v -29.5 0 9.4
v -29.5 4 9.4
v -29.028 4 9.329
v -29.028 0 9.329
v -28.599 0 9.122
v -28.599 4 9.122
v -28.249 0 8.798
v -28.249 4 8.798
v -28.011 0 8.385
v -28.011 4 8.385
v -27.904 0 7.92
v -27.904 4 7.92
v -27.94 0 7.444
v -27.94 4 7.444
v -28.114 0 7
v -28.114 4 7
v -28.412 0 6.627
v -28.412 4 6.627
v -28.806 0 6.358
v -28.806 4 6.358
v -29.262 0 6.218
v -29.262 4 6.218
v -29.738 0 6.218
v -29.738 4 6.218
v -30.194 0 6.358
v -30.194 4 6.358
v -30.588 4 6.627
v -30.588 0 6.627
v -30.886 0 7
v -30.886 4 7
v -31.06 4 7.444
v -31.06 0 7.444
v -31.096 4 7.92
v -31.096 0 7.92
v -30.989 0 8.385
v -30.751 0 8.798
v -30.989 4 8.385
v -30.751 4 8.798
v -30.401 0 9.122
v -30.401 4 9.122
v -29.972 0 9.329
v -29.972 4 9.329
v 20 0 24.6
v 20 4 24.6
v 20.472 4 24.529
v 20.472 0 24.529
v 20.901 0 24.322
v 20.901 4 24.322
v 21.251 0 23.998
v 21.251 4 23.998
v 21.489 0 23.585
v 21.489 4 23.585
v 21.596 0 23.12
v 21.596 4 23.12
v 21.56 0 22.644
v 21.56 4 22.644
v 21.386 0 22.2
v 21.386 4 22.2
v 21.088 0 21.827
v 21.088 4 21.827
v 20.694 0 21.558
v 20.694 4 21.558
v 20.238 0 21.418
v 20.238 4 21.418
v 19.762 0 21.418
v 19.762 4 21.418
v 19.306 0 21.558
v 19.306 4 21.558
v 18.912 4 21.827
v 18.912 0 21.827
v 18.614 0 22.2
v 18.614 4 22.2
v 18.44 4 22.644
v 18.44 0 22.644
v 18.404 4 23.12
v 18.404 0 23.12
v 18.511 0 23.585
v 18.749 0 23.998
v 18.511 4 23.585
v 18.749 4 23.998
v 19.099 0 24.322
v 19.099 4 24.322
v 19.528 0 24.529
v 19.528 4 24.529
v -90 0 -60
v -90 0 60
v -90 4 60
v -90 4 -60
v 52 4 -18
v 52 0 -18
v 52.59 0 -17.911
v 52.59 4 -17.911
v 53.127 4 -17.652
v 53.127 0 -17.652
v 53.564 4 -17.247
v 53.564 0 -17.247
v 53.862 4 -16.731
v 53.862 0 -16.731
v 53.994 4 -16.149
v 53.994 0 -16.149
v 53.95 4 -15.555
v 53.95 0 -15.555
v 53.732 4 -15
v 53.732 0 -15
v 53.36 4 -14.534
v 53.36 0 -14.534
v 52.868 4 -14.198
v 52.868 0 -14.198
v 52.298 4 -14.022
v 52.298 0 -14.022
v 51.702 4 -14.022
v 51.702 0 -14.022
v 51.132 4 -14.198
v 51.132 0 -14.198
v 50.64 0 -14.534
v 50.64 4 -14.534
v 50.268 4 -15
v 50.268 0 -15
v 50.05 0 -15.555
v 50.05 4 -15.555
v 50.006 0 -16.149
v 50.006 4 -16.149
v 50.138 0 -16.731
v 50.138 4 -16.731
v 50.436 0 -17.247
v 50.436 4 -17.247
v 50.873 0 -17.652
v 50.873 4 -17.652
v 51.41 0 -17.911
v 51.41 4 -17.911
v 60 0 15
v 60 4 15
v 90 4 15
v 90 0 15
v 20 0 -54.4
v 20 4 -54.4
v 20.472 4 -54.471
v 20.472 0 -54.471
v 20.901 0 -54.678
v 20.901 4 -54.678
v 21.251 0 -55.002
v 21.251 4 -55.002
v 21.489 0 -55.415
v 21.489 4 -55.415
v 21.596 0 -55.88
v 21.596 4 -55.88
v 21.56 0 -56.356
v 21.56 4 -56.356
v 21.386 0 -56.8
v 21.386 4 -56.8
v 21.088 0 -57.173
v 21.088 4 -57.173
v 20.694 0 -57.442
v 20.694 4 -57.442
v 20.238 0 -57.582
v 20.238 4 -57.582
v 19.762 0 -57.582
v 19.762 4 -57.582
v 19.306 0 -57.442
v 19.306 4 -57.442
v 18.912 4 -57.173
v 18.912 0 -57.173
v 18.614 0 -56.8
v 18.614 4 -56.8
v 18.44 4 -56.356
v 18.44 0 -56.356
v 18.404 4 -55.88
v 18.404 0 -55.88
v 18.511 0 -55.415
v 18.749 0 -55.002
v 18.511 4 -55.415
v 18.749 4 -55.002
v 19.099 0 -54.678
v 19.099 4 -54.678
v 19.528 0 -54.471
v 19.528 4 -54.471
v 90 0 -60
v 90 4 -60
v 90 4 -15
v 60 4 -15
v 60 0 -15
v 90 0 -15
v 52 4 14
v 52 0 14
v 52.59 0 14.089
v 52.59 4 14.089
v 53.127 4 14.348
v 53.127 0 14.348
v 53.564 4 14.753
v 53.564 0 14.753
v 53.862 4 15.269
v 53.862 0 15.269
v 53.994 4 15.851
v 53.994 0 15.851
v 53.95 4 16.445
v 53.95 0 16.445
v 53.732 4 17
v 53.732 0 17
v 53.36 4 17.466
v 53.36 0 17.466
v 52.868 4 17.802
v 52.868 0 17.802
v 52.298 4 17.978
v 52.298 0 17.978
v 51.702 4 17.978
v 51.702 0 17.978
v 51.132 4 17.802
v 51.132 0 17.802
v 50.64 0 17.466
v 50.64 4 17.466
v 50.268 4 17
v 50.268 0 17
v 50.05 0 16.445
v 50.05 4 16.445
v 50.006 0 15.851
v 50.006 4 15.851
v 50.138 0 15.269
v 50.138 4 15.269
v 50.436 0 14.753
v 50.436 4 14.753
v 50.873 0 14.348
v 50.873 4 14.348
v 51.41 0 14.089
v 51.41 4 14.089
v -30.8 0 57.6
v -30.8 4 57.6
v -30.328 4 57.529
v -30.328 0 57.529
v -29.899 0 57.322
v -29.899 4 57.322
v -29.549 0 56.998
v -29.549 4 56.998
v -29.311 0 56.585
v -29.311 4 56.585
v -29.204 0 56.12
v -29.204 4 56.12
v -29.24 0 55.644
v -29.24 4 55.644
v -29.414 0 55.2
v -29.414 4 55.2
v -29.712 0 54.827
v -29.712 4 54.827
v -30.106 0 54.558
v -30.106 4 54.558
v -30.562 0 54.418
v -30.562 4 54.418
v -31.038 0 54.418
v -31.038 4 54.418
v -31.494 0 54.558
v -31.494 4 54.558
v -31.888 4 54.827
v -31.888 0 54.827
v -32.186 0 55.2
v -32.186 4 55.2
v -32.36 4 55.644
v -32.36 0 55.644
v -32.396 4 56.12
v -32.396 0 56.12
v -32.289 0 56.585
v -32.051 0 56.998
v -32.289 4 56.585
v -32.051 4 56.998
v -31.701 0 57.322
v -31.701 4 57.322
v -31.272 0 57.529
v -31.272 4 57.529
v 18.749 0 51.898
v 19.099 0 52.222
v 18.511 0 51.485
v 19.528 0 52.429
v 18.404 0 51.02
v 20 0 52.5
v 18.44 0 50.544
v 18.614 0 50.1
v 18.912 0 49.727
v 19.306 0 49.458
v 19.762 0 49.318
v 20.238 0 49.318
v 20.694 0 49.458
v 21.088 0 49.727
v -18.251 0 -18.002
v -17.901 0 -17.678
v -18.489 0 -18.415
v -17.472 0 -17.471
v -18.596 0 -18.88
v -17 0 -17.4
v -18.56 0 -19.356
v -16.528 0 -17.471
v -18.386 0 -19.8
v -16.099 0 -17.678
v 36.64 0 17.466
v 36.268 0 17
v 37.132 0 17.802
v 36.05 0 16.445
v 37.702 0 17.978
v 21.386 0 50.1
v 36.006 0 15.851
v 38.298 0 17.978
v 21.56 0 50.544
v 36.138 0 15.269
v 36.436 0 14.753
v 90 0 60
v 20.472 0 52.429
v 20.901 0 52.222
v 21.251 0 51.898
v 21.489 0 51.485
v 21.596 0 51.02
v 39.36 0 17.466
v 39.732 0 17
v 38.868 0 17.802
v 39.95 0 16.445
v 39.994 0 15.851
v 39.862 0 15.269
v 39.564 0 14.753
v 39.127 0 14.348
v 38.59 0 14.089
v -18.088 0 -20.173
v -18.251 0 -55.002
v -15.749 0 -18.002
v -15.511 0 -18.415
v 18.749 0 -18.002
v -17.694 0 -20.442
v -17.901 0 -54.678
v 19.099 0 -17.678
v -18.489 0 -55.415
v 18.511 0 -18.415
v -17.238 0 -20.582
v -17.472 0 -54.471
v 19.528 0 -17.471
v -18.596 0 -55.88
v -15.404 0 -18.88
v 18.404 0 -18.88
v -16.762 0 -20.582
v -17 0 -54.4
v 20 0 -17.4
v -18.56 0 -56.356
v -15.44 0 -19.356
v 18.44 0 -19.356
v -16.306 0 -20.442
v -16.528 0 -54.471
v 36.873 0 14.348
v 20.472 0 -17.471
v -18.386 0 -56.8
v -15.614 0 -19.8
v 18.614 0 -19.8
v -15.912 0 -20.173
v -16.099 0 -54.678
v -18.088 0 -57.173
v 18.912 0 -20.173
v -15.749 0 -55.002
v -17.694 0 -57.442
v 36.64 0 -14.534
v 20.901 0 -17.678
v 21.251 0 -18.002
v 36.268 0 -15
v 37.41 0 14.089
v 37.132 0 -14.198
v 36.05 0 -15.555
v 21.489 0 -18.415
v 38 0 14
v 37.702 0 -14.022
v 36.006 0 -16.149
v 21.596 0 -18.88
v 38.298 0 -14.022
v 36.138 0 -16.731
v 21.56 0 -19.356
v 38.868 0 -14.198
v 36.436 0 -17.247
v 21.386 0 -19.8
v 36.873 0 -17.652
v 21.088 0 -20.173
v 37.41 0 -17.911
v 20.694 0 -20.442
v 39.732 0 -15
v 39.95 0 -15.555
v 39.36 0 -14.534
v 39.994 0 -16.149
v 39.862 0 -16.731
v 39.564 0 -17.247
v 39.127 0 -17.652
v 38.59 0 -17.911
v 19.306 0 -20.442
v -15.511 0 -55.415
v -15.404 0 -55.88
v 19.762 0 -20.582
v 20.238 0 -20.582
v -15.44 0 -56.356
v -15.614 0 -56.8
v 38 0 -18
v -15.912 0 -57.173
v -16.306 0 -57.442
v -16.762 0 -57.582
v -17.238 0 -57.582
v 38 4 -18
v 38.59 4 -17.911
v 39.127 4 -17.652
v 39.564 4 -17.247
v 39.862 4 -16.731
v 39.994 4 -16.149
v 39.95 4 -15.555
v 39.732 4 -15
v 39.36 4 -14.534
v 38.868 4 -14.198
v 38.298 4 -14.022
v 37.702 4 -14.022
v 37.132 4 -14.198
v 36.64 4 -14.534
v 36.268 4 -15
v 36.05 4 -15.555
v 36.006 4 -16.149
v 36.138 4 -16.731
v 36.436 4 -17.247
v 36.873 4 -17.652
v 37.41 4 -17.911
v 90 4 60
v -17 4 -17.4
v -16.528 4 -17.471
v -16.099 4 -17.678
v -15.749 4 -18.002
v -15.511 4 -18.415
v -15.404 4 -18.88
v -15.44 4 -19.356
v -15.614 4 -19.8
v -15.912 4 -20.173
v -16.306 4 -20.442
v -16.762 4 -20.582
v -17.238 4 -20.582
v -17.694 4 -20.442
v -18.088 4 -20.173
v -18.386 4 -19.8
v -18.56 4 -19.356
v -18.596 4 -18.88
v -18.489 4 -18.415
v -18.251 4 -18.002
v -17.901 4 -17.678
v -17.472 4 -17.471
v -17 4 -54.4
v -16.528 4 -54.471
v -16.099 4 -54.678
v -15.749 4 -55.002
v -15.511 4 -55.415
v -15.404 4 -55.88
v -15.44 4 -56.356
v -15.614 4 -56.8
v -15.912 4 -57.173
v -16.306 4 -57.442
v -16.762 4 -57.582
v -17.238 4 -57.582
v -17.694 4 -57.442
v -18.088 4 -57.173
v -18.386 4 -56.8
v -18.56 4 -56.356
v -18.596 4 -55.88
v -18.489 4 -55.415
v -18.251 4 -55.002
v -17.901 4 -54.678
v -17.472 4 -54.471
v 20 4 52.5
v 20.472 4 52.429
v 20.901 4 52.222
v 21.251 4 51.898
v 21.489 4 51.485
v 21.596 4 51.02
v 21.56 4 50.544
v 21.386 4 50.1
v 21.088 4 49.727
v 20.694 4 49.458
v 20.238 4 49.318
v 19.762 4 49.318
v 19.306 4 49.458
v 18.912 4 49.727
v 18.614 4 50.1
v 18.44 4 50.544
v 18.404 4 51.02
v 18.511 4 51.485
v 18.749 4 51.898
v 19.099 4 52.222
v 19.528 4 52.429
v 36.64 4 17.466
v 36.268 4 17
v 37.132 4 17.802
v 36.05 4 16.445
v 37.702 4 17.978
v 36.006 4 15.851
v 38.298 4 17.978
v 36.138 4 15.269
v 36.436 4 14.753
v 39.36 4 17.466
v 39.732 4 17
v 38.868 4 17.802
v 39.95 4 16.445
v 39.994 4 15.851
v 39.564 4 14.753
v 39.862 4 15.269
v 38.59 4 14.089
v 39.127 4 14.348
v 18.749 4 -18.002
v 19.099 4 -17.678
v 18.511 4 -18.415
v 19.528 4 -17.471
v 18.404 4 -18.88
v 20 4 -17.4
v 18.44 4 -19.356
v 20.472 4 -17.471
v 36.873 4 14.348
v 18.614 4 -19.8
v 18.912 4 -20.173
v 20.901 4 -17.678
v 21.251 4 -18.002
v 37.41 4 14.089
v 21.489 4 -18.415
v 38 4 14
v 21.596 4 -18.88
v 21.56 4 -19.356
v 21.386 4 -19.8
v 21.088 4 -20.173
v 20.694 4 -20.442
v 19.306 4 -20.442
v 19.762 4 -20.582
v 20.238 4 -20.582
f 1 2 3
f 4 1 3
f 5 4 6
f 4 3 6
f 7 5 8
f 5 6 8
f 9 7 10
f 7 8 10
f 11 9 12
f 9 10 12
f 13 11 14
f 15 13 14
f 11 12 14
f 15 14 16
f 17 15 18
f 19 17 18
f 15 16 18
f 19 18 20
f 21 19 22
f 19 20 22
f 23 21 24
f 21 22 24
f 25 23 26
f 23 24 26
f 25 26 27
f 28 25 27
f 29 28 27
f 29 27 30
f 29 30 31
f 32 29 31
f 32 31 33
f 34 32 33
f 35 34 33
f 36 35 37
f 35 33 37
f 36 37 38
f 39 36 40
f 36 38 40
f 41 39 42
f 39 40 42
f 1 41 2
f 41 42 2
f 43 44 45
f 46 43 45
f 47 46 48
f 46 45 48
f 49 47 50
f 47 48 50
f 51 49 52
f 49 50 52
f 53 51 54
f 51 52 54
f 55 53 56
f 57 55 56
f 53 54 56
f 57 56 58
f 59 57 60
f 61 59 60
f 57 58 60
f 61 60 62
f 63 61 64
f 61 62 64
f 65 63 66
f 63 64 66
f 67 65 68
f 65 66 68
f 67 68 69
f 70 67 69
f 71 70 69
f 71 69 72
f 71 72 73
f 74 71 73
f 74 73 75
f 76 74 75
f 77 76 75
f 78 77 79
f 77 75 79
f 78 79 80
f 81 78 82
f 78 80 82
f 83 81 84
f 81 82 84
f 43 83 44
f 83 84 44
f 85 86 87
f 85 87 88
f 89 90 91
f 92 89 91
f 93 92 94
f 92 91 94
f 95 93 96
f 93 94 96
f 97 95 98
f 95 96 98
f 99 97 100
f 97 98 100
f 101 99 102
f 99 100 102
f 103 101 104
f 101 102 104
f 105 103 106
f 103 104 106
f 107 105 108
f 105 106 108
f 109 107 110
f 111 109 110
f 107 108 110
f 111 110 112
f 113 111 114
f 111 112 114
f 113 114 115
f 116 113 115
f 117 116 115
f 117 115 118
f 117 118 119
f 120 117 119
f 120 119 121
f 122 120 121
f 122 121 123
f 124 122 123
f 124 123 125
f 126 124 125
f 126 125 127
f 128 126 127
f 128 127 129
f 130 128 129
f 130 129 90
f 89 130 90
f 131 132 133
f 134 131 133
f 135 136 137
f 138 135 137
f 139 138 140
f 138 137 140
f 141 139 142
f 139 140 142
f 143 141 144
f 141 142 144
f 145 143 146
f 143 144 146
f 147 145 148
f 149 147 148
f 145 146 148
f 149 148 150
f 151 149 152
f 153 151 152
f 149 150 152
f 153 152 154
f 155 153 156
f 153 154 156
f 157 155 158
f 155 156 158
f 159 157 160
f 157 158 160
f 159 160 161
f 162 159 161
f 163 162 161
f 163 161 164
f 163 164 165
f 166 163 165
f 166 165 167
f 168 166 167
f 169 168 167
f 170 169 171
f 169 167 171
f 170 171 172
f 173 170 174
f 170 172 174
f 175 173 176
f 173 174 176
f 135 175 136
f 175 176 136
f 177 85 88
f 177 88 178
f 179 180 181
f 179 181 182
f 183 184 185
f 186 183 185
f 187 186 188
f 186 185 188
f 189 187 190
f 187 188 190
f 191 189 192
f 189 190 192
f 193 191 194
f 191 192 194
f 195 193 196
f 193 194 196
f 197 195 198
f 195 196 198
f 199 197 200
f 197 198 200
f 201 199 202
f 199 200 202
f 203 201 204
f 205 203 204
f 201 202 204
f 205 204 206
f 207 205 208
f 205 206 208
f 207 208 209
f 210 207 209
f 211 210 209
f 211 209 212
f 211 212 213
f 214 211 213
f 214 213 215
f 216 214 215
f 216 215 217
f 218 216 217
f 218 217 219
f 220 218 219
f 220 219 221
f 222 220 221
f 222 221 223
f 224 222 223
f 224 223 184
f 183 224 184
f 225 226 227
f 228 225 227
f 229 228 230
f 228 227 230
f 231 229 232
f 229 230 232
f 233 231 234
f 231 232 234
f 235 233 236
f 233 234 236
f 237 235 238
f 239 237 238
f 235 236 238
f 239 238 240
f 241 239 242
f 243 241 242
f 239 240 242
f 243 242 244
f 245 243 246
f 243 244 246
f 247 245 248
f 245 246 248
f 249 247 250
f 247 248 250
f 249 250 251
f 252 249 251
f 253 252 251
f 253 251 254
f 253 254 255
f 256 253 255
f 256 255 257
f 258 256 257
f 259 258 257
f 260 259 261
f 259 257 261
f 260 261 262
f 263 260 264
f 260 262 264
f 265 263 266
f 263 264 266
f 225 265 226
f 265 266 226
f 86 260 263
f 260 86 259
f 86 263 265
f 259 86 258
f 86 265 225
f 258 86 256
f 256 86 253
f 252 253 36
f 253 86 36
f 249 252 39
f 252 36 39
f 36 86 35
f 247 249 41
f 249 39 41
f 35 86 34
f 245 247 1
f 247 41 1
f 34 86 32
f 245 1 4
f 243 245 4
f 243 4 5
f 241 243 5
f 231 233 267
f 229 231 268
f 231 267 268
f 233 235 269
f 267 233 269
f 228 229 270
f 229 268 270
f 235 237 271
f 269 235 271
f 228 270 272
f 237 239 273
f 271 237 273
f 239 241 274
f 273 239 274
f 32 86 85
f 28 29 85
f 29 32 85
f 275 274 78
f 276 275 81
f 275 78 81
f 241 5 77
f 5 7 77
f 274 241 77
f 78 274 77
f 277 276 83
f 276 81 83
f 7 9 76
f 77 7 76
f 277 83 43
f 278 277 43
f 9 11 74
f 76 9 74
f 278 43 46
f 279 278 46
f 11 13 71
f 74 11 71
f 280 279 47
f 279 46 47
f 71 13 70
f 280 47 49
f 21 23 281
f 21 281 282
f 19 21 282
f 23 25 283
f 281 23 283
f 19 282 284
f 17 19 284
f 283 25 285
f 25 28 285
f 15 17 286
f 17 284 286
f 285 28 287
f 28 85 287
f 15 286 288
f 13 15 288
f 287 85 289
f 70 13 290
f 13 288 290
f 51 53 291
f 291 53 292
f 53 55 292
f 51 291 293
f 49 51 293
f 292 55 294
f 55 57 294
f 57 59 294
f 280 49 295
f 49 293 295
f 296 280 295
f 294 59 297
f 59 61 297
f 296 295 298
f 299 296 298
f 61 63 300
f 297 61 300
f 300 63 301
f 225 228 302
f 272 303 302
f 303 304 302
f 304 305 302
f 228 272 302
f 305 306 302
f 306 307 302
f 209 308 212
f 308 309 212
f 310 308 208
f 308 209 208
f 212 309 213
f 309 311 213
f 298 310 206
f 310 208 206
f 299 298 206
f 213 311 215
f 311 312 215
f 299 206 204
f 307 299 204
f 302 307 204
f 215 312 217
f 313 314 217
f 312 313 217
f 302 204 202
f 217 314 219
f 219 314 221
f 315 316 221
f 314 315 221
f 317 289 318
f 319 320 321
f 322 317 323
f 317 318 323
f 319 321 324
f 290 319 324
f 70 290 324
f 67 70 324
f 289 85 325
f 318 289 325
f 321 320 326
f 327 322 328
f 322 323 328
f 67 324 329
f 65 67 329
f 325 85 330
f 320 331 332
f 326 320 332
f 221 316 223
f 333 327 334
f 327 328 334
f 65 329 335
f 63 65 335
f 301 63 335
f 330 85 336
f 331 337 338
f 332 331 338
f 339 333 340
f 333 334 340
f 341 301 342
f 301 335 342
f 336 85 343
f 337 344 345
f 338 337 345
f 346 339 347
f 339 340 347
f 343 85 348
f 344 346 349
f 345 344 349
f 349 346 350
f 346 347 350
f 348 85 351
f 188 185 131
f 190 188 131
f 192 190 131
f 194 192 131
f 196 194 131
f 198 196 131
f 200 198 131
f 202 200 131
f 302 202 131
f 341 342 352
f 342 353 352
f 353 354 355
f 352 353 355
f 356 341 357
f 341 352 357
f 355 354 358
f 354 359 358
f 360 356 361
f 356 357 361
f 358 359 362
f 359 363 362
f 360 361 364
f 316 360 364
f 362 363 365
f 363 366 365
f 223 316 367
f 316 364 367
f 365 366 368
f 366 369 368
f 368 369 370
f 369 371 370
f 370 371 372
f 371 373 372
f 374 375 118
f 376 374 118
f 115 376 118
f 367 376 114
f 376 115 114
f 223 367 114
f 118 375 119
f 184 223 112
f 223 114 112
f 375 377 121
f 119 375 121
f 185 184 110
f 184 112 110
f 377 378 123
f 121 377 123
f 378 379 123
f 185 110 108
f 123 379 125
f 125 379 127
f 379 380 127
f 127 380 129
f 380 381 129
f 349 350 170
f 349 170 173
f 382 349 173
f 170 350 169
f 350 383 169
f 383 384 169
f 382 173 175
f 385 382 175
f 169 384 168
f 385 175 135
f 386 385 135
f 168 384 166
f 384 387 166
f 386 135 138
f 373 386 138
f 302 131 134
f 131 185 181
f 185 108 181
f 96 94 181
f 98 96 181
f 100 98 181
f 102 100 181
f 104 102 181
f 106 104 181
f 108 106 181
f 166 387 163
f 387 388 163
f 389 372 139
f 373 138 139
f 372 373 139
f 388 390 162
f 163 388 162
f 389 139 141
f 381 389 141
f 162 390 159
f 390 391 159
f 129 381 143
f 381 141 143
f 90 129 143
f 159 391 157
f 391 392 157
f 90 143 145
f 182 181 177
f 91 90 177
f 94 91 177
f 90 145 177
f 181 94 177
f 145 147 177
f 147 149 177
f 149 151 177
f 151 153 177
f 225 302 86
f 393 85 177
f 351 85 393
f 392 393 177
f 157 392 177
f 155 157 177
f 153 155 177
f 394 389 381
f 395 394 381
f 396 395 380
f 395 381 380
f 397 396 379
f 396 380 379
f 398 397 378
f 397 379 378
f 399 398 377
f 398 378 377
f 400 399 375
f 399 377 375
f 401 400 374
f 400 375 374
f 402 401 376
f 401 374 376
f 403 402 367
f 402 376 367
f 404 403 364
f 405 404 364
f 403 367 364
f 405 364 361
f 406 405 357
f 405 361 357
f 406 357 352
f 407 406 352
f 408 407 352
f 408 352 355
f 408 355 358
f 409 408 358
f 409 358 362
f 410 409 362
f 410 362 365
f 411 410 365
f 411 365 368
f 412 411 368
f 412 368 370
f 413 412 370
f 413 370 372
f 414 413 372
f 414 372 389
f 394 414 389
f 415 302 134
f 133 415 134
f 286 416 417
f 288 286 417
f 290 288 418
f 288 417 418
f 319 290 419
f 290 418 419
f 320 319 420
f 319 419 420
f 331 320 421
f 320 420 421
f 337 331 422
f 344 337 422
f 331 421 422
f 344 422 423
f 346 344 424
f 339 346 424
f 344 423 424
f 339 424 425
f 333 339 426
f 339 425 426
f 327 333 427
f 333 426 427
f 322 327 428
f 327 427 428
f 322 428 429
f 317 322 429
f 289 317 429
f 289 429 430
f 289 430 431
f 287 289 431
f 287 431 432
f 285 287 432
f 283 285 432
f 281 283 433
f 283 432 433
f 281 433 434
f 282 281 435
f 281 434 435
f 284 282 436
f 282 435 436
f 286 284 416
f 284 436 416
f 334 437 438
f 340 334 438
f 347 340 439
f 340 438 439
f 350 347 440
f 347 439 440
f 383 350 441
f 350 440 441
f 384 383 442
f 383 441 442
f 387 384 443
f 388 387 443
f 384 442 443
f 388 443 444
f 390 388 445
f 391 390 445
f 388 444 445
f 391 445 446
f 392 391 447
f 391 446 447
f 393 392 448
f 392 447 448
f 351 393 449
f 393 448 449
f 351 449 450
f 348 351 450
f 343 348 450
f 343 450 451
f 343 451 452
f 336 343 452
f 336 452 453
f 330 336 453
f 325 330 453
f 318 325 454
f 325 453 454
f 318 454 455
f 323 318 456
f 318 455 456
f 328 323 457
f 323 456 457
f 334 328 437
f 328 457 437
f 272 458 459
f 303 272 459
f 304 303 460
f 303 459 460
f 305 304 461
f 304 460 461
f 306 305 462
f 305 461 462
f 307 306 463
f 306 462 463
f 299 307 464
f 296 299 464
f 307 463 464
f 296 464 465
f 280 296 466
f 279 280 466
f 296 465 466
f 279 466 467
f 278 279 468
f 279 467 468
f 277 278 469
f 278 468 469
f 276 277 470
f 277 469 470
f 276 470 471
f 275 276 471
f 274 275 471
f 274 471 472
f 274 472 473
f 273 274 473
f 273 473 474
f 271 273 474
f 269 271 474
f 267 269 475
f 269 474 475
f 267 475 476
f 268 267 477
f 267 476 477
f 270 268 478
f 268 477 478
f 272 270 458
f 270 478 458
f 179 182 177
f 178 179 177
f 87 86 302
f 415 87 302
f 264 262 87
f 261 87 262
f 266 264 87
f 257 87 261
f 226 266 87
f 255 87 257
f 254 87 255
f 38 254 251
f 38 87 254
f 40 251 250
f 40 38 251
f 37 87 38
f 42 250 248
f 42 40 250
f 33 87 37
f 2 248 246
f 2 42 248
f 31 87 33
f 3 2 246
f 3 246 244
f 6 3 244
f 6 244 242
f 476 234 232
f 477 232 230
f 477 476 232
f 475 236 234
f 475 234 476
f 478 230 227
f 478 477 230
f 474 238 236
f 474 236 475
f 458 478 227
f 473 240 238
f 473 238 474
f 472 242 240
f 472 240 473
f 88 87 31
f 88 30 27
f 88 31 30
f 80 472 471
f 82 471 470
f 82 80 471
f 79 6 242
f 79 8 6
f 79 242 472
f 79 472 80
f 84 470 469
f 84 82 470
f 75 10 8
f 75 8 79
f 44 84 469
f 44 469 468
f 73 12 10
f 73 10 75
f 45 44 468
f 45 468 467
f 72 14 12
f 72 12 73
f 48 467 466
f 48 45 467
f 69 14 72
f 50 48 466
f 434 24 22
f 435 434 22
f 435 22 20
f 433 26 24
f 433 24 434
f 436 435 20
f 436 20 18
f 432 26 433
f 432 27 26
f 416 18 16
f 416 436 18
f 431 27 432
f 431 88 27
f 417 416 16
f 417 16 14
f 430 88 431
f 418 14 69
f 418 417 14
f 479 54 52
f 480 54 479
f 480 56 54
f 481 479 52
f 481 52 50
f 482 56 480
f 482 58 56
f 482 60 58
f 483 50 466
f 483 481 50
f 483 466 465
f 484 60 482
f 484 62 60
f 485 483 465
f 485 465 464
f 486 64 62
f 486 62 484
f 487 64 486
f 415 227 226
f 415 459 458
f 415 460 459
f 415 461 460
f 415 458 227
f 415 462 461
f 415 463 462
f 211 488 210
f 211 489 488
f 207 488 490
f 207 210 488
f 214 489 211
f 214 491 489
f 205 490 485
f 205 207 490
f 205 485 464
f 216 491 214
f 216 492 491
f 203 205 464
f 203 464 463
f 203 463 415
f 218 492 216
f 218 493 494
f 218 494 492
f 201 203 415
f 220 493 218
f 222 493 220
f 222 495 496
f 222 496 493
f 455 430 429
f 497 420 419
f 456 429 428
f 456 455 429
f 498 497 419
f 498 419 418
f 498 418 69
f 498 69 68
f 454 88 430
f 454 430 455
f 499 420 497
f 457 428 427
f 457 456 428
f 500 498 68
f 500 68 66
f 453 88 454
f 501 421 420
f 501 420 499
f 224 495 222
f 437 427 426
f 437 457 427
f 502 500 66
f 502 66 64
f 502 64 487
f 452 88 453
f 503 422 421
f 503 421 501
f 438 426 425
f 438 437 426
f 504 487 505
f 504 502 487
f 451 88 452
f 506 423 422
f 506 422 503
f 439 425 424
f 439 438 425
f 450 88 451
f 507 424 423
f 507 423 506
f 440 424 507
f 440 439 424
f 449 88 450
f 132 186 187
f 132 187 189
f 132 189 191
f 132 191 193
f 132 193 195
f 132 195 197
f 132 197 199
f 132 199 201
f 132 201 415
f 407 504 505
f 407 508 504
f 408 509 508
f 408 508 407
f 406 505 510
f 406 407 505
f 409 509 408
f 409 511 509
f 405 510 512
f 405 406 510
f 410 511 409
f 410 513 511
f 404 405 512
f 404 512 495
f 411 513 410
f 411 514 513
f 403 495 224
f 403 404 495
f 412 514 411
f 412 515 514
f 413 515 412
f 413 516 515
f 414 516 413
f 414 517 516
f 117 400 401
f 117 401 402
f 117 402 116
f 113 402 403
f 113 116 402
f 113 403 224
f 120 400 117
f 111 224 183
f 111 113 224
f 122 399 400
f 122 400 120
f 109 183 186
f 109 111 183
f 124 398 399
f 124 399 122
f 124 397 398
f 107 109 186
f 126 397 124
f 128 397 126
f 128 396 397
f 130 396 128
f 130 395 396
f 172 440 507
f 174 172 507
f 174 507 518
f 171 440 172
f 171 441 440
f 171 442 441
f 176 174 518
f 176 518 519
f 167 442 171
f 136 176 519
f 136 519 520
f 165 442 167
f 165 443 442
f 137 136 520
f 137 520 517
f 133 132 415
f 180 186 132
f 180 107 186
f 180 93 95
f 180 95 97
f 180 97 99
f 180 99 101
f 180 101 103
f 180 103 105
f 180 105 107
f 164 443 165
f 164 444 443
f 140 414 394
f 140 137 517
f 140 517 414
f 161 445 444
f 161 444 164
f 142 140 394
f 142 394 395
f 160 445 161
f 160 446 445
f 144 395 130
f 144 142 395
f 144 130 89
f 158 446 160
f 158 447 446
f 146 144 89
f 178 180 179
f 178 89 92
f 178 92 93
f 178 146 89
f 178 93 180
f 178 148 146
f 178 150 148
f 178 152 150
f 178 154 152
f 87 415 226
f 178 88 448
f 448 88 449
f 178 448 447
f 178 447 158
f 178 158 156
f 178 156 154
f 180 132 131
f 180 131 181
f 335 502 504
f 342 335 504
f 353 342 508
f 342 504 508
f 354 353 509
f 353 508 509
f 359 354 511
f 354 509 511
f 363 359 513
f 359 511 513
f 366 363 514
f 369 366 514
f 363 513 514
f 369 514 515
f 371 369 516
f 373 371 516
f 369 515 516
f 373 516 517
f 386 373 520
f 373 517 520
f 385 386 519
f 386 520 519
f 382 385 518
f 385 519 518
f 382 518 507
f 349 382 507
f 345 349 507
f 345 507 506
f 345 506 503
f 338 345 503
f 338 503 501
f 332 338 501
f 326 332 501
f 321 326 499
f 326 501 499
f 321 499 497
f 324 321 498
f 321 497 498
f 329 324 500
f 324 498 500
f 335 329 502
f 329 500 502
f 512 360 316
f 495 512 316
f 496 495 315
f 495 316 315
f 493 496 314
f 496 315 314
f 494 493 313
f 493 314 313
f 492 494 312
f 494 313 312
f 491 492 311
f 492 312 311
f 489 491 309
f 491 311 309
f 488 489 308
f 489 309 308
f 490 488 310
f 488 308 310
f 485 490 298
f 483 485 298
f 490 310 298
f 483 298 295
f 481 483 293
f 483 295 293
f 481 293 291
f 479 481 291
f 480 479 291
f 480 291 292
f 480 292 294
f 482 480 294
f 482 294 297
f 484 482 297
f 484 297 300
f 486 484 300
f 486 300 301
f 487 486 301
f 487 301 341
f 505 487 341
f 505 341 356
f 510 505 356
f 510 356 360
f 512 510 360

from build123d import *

# Parameters (mm, degrees)
SKETCH_1_W          = 180
SKETCH_1_H          = 120
EXTRUDE_1_DEPTH     = 4
SKETCH_3_W          = 40
SKETCH_3_H          = 30
CUT_EXTRUDE_2_DEPTH = 4
SKETCH_4_R          = 1.6
CUT_EXTRUDE_3_DEPTH = 4
SKETCH_5_R          = 1.6
CUT_EXTRUDE_4_DEPTH = 4
SKETCH_7_R          = 2
CUT_EXTRUDE_5_DEPTH = 10


with BuildPart() as part:
    # 草图1 → 凸台-拉伸1 (new body)
    with BuildSketch(Plane(origin=(0, 0, 0), x_dir=(1, 0, 0), z_dir=(0, 1, 0))):
        Rectangle(SKETCH_1_W, SKETCH_1_H)
    extrude(amount=EXTRUDE_1_DEPTH)

    # 草图3 → 切除-拉伸2 (cut)
    with BuildSketch(Plane(origin=(0, 4, 0), x_dir=(1, 0, 0), z_dir=(0, 1, 0))):
        with Locations((80, 0)):
            Rectangle(SKETCH_3_W, SKETCH_3_H)
    extrude(amount=-CUT_EXTRUDE_2_DEPTH, mode=Mode.SUBTRACT)

    # 草图4 → 切除-拉伸3 (cut)
    with BuildSketch(Plane(origin=(0, 4, 0), x_dir=(1, 0, 0), z_dir=(0, 1, 0))):
        with Locations(Location((-17, 56, 0), (0, 0, 270))):
            Circle(SKETCH_4_R)
        with Locations(Location((20, 56, 0), (0, 0, 270))):
            Circle(SKETCH_4_R)
        with Locations(Location((20, 19, 0), (0, 0, 270))):
            Circle(SKETCH_4_R)
        with Locations(Location((-17, 19, 0), (0, 0, 270))):
            Circle(SKETCH_4_R)
    extrude(amount=-CUT_EXTRUDE_3_DEPTH, mode=Mode.SUBTRACT)

    # 草图5 → 切除-拉伸4 (cut)
    with BuildSketch(Plane(origin=(0, 4, 0), x_dir=(1, 0, 0), z_dir=(0, 1, 0))):
        with Locations(Location((-29.5, -7.8, 0), (0, 0, 270))):
            Circle(SKETCH_5_R)
        with Locations(Location((20, -23, 0), (0, 0, 270))):
            Circle(SKETCH_5_R)
        with Locations(Location((20, -50.9, 0), (0, 0, 270))):
            Circle(SKETCH_5_R)
        with Locations(Location((-30.8, -56, 0), (0, 0, 270))):
            Circle(SKETCH_5_R)
    extrude(amount=-CUT_EXTRUDE_4_DEPTH, mode=Mode.SUBTRACT)

    # 草图7 → 切除-拉伸5 (cut)
    with BuildSketch(Plane.XZ):
        with Locations(Location((52, 16, 0), (0, 0, 270))):
            Circle(SKETCH_7_R)
        with Locations(Location((38, 16, 0), (0, 0, 270))):
            Circle(SKETCH_7_R)
        with Locations(Location((52, -16, 0), (0, 0, 270))):
            Circle(SKETCH_7_R)
        with Locations(Location((38, -16, 0), (0, 0, 270))):
            Circle(SKETCH_7_R)
    extrude(amount=-CUT_EXTRUDE_5_DEPTH, mode=Mode.SUBTRACT)


solid = part.part
